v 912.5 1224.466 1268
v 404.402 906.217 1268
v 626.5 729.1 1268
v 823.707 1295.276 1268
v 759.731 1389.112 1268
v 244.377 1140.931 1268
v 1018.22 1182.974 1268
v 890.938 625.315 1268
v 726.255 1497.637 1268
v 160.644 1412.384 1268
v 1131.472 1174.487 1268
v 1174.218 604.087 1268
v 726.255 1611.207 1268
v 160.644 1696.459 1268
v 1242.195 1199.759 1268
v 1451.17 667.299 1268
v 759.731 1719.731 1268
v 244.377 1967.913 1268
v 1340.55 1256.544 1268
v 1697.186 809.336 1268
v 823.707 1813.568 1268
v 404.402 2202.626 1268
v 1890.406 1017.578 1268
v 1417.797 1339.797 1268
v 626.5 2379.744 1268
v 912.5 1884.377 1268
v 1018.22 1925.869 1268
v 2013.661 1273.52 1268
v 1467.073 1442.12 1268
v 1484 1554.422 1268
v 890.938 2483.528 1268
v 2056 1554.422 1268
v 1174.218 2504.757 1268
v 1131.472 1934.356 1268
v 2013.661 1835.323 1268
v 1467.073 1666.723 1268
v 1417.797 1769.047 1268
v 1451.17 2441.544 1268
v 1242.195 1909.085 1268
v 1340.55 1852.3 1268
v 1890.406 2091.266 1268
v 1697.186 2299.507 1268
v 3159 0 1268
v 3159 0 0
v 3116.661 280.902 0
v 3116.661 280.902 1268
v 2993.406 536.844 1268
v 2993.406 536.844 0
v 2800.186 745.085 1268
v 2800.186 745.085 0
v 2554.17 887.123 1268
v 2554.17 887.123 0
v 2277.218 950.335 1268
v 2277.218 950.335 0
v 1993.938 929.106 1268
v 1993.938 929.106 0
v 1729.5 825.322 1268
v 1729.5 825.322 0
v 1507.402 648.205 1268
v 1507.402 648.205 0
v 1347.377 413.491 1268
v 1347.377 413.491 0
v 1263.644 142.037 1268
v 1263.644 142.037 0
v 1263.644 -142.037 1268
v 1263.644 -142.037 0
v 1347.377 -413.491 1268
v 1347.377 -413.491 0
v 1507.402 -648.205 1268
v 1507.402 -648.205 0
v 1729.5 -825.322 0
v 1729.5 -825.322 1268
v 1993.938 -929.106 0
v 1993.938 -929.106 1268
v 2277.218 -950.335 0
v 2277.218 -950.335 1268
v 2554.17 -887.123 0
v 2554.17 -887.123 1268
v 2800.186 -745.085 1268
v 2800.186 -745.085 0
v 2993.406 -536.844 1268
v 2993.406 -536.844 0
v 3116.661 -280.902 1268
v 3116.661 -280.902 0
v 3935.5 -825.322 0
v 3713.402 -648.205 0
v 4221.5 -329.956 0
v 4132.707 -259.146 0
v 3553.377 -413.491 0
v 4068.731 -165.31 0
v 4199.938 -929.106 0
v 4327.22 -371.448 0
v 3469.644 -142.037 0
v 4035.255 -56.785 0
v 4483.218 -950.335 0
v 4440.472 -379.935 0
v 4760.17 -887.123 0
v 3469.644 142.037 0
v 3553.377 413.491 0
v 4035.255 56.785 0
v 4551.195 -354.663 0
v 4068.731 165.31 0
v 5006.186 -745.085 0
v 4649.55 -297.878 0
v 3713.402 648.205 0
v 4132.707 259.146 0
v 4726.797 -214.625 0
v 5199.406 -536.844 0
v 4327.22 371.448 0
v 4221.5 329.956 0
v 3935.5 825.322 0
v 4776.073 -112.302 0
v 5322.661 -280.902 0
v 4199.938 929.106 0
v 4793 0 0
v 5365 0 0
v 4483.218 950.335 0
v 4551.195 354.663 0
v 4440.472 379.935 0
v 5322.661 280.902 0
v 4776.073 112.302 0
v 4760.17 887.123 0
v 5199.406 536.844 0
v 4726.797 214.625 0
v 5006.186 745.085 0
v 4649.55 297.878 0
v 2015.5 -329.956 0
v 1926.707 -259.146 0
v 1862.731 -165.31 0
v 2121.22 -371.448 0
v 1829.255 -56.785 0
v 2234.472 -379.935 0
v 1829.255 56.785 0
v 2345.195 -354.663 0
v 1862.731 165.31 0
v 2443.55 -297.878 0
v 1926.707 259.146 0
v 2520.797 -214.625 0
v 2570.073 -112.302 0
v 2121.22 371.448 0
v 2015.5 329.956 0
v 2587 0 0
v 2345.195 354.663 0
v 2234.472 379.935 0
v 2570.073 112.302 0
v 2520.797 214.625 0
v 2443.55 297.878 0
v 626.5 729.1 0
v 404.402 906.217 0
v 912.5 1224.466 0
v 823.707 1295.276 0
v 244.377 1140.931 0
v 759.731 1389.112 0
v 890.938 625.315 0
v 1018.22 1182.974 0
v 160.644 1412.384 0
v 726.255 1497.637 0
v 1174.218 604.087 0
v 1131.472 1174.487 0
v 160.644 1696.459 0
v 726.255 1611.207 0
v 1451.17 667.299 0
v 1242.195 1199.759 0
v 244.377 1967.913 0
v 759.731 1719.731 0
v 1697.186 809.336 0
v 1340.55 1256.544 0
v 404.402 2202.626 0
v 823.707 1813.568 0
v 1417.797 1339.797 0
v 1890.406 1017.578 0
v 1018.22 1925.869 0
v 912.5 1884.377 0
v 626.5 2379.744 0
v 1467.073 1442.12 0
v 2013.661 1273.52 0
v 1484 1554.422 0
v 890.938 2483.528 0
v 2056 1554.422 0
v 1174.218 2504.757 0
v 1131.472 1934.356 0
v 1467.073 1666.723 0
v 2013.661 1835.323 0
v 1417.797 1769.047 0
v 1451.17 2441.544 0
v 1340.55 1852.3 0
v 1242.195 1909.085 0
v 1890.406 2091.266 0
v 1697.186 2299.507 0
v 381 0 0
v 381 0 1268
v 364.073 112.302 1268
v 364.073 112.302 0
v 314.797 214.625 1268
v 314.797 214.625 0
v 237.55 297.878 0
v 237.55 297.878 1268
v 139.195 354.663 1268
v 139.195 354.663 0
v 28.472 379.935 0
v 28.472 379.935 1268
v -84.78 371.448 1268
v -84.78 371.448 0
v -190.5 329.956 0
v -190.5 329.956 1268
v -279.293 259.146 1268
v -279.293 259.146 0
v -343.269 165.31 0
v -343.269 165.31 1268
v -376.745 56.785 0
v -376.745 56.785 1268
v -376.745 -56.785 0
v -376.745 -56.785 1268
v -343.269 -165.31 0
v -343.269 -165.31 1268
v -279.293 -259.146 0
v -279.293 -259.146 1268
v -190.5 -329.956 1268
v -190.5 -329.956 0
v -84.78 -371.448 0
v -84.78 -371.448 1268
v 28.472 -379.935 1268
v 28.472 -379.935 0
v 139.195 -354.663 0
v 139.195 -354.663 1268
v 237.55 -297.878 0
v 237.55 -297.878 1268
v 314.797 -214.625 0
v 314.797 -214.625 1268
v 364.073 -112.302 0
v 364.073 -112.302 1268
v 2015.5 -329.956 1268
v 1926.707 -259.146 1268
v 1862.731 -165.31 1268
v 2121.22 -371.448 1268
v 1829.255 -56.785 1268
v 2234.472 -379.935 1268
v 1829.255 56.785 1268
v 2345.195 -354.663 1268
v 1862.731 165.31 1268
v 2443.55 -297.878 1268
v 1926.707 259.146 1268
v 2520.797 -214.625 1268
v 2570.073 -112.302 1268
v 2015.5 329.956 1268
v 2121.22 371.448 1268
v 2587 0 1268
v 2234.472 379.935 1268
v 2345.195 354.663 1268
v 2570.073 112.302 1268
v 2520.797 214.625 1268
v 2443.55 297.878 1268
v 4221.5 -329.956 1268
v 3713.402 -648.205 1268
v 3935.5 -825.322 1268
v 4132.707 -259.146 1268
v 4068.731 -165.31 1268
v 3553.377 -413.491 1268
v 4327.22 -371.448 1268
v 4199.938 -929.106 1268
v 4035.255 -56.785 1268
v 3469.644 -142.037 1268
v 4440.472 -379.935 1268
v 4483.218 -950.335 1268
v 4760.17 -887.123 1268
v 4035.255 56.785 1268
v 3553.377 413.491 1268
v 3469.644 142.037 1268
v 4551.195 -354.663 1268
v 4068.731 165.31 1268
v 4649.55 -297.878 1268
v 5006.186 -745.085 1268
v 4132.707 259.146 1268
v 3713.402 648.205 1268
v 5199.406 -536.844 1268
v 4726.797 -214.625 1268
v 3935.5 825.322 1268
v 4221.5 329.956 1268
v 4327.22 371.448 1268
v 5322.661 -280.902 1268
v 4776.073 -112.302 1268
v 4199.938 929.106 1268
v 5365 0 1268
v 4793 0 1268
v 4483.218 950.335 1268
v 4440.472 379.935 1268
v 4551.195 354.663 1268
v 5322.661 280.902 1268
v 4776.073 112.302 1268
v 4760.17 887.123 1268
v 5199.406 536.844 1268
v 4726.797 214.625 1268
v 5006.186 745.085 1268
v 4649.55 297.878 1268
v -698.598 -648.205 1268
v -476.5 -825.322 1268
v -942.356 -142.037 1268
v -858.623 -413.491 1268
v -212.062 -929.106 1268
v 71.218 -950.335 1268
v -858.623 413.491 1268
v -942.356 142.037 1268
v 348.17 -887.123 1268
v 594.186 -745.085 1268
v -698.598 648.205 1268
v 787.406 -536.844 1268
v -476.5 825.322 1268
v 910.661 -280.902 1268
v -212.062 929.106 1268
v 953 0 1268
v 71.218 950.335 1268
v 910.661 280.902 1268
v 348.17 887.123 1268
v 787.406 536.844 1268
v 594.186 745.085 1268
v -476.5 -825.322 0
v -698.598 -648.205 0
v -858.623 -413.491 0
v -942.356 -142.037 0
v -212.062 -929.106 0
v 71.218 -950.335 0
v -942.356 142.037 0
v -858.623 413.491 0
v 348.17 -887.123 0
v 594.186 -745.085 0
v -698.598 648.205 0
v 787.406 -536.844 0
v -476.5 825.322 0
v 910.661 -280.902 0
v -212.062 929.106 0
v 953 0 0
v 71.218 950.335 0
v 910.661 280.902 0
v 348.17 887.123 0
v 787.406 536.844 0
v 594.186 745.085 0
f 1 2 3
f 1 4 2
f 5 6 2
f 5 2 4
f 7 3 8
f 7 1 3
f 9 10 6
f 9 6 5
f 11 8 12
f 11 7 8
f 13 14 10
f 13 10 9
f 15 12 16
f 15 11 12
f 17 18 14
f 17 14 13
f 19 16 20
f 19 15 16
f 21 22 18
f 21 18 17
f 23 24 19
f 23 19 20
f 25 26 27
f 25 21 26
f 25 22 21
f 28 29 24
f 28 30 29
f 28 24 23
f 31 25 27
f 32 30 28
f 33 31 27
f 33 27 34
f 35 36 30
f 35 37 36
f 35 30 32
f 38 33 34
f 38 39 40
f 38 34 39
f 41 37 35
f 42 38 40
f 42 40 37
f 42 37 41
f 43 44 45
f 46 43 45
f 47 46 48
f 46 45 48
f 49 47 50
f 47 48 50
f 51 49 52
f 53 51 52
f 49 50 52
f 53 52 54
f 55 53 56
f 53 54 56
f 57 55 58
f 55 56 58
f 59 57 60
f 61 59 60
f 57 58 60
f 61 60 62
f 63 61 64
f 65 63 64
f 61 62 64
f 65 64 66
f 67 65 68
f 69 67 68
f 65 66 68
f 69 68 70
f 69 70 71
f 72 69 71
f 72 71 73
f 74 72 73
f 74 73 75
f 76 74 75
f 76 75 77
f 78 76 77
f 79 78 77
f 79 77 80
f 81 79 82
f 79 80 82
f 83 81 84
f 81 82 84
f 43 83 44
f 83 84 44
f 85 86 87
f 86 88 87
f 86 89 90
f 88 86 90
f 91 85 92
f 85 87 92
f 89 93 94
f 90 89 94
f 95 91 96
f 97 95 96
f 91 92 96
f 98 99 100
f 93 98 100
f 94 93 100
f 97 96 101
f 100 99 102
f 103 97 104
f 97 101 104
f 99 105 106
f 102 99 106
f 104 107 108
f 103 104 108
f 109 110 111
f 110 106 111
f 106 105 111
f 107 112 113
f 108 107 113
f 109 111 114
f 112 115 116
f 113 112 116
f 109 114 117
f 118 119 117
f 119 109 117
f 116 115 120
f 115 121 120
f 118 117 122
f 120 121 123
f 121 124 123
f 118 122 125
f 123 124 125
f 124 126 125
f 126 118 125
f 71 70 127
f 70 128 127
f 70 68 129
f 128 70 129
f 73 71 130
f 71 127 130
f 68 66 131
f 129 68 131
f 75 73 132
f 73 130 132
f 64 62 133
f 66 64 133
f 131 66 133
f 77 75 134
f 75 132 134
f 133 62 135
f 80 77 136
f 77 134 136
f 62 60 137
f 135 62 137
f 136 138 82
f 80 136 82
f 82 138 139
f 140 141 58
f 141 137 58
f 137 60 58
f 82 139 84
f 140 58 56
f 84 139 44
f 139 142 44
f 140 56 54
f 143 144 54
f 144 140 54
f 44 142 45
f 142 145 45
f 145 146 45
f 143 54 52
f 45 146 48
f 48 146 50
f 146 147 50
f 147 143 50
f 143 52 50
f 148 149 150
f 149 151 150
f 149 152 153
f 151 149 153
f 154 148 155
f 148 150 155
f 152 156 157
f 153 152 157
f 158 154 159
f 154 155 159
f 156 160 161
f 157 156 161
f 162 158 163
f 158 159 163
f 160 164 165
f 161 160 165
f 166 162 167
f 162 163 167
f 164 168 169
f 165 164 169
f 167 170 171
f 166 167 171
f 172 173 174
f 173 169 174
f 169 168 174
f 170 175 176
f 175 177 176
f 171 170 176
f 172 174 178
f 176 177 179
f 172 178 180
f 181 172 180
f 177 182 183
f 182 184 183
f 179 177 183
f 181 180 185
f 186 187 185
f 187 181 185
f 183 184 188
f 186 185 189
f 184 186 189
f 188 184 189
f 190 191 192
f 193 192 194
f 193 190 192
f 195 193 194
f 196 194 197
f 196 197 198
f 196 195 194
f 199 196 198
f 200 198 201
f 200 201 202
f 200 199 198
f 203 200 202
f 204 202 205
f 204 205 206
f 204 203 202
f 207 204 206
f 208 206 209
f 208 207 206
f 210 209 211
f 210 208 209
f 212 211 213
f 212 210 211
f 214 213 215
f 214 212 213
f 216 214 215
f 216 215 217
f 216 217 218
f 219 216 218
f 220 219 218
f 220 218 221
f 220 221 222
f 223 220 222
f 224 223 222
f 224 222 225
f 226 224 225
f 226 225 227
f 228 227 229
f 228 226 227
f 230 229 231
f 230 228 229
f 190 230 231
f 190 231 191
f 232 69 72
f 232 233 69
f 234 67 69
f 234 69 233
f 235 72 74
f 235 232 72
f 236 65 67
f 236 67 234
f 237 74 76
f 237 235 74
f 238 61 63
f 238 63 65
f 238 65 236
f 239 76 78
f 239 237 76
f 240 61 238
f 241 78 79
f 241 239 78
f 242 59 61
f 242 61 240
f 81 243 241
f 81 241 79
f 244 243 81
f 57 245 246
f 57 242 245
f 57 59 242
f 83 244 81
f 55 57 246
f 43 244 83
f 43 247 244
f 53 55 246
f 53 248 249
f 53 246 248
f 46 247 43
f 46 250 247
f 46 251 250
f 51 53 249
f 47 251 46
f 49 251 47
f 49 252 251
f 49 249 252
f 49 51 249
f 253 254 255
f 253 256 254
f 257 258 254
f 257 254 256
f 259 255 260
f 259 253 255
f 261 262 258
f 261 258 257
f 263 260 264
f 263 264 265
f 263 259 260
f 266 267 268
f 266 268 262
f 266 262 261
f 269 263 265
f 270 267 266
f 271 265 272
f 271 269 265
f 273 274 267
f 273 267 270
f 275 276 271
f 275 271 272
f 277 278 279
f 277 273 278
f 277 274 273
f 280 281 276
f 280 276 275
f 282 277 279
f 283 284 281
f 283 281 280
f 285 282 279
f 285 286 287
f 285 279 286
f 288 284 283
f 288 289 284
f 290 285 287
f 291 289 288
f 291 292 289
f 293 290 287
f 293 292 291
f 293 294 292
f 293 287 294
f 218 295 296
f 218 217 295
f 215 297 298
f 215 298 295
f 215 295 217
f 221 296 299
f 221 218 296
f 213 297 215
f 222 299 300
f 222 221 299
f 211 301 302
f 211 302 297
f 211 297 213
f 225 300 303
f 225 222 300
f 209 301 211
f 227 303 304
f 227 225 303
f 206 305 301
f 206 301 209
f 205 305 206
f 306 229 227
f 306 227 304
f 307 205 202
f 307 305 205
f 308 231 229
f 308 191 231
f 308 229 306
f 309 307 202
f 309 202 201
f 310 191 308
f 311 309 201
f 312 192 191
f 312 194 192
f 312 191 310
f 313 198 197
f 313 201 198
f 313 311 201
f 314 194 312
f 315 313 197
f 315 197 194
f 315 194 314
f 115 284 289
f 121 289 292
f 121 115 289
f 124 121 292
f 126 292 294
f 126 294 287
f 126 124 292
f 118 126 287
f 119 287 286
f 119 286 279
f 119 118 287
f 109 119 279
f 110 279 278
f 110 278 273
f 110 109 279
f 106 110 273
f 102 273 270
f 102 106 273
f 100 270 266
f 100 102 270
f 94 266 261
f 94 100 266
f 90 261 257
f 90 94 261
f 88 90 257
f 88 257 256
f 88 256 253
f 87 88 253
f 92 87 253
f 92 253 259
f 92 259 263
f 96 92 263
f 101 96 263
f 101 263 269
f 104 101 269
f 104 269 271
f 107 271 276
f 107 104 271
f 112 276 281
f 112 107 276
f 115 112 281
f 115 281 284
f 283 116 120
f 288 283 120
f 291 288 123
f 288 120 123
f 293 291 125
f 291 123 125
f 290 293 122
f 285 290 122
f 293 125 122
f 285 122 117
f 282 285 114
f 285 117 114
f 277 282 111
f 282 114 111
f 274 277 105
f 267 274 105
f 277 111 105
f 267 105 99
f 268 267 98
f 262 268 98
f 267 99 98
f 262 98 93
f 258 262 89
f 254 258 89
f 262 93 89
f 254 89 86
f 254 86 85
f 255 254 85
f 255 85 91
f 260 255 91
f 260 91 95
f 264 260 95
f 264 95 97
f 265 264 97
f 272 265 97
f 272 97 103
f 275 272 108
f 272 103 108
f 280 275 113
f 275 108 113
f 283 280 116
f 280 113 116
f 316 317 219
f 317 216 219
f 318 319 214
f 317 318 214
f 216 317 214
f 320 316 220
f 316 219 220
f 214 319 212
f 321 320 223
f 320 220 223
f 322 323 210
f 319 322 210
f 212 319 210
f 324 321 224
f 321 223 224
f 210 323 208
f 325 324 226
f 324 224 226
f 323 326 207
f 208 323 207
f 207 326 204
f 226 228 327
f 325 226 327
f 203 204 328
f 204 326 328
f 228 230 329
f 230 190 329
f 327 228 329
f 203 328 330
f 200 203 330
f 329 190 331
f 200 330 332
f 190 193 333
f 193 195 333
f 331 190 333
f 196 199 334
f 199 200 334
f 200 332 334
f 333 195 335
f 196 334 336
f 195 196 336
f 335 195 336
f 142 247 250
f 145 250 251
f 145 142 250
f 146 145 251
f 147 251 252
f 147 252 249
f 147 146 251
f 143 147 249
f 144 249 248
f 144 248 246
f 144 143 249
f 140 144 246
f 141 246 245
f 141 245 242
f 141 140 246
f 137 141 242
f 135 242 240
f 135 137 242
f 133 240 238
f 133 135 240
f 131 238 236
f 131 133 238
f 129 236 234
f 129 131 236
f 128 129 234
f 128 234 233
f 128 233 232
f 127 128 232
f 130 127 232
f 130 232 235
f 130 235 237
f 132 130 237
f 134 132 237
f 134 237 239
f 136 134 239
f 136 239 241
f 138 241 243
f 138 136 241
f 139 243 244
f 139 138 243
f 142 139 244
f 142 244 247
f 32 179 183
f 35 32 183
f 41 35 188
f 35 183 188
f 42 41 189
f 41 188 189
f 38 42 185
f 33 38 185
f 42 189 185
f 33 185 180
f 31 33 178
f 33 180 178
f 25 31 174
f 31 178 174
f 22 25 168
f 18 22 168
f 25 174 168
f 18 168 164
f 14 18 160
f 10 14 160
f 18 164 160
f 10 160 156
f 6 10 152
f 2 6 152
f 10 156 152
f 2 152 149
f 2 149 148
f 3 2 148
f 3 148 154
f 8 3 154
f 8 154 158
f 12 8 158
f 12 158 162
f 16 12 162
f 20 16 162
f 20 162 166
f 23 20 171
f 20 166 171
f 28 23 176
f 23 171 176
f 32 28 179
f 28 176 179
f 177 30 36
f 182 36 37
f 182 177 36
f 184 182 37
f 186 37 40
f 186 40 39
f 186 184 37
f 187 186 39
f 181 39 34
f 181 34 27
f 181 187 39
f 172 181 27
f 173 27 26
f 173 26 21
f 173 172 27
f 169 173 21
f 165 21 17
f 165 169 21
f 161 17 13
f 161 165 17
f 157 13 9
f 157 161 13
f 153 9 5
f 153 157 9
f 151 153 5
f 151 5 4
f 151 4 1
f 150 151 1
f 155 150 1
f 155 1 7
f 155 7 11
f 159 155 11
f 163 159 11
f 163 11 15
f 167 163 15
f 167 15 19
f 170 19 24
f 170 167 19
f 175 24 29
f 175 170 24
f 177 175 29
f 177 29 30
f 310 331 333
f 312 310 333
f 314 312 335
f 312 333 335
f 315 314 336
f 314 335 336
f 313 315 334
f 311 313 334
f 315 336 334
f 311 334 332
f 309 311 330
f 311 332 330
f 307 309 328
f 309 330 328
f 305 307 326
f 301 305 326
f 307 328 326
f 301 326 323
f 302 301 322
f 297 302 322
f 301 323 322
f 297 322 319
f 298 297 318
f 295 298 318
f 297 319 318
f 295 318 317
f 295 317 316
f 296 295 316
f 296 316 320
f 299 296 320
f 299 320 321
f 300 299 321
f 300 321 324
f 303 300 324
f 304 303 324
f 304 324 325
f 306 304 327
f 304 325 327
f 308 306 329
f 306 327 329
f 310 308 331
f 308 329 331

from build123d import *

# Parameters (mm, degrees)
SZKIC1_R                      = 953
SZKIC1_R_2                    = 381
DODANIE_WYCI_GNI_CIE1_DEPTH   = 1268
DODANIE_WYCI_GNI_CIE1_2_DEPTH = 1268
DODANIE_WYCI_GNI_CIE1_3_DEPTH = 1268
DODANIE_WYCI_GNI_CIE1_4_DEPTH = 1268


with BuildPart() as part:
    # Szkic1 → Dodanie-wyciągnięcie1 (new body)
    with BuildSketch(Plane.XY):
        Circle(SZKIC1_R)
        Circle(SZKIC1_R_2, mode=Mode.SUBTRACT)
    extrude(amount=DODANIE_WYCI_GNI_CIE1_DEPTH)


with BuildPart() as body_2:
    # Szkic1 → Dodanie-wyci_gni_cie1 2 (new body)
    with BuildSketch(Plane.XY):
        with Locations((2206, 0)):
            Circle(SZKIC1_R)
        with Locations((2206, 0)):
            Circle(SZKIC1_R_2, mode=Mode.SUBTRACT)
    extrude(amount=DODANIE_WYCI_GNI_CIE1_2_DEPTH)


with BuildPart() as body_3:
    # Szkic1 → Dodanie-wyci_gni_cie1 3 (new body)
    with BuildSketch(Plane.XY):
        with Locations((4412, 0)):
            Circle(SZKIC1_R)
        with Locations((4412, 0)):
            Circle(SZKIC1_R_2, mode=Mode.SUBTRACT)
    extrude(amount=DODANIE_WYCI_GNI_CIE1_3_DEPTH)


with BuildPart() as body_4:
    # Szkic1 → Dodanie-wyci_gni_cie1 4 (new body)
    with BuildSketch(Plane.XY):
        with Locations((1103, 1554.421757439)):
            Circle(SZKIC1_R)
        with Locations((1103, 1554.421757439)):
            Circle(SZKIC1_R_2, mode=Mode.SUBTRACT)
    extrude(amount=DODANIE_WYCI_GNI_CIE1_4_DEPTH)


solid = Compound([part.part, body_2.part, body_3.part, body_4.part])
